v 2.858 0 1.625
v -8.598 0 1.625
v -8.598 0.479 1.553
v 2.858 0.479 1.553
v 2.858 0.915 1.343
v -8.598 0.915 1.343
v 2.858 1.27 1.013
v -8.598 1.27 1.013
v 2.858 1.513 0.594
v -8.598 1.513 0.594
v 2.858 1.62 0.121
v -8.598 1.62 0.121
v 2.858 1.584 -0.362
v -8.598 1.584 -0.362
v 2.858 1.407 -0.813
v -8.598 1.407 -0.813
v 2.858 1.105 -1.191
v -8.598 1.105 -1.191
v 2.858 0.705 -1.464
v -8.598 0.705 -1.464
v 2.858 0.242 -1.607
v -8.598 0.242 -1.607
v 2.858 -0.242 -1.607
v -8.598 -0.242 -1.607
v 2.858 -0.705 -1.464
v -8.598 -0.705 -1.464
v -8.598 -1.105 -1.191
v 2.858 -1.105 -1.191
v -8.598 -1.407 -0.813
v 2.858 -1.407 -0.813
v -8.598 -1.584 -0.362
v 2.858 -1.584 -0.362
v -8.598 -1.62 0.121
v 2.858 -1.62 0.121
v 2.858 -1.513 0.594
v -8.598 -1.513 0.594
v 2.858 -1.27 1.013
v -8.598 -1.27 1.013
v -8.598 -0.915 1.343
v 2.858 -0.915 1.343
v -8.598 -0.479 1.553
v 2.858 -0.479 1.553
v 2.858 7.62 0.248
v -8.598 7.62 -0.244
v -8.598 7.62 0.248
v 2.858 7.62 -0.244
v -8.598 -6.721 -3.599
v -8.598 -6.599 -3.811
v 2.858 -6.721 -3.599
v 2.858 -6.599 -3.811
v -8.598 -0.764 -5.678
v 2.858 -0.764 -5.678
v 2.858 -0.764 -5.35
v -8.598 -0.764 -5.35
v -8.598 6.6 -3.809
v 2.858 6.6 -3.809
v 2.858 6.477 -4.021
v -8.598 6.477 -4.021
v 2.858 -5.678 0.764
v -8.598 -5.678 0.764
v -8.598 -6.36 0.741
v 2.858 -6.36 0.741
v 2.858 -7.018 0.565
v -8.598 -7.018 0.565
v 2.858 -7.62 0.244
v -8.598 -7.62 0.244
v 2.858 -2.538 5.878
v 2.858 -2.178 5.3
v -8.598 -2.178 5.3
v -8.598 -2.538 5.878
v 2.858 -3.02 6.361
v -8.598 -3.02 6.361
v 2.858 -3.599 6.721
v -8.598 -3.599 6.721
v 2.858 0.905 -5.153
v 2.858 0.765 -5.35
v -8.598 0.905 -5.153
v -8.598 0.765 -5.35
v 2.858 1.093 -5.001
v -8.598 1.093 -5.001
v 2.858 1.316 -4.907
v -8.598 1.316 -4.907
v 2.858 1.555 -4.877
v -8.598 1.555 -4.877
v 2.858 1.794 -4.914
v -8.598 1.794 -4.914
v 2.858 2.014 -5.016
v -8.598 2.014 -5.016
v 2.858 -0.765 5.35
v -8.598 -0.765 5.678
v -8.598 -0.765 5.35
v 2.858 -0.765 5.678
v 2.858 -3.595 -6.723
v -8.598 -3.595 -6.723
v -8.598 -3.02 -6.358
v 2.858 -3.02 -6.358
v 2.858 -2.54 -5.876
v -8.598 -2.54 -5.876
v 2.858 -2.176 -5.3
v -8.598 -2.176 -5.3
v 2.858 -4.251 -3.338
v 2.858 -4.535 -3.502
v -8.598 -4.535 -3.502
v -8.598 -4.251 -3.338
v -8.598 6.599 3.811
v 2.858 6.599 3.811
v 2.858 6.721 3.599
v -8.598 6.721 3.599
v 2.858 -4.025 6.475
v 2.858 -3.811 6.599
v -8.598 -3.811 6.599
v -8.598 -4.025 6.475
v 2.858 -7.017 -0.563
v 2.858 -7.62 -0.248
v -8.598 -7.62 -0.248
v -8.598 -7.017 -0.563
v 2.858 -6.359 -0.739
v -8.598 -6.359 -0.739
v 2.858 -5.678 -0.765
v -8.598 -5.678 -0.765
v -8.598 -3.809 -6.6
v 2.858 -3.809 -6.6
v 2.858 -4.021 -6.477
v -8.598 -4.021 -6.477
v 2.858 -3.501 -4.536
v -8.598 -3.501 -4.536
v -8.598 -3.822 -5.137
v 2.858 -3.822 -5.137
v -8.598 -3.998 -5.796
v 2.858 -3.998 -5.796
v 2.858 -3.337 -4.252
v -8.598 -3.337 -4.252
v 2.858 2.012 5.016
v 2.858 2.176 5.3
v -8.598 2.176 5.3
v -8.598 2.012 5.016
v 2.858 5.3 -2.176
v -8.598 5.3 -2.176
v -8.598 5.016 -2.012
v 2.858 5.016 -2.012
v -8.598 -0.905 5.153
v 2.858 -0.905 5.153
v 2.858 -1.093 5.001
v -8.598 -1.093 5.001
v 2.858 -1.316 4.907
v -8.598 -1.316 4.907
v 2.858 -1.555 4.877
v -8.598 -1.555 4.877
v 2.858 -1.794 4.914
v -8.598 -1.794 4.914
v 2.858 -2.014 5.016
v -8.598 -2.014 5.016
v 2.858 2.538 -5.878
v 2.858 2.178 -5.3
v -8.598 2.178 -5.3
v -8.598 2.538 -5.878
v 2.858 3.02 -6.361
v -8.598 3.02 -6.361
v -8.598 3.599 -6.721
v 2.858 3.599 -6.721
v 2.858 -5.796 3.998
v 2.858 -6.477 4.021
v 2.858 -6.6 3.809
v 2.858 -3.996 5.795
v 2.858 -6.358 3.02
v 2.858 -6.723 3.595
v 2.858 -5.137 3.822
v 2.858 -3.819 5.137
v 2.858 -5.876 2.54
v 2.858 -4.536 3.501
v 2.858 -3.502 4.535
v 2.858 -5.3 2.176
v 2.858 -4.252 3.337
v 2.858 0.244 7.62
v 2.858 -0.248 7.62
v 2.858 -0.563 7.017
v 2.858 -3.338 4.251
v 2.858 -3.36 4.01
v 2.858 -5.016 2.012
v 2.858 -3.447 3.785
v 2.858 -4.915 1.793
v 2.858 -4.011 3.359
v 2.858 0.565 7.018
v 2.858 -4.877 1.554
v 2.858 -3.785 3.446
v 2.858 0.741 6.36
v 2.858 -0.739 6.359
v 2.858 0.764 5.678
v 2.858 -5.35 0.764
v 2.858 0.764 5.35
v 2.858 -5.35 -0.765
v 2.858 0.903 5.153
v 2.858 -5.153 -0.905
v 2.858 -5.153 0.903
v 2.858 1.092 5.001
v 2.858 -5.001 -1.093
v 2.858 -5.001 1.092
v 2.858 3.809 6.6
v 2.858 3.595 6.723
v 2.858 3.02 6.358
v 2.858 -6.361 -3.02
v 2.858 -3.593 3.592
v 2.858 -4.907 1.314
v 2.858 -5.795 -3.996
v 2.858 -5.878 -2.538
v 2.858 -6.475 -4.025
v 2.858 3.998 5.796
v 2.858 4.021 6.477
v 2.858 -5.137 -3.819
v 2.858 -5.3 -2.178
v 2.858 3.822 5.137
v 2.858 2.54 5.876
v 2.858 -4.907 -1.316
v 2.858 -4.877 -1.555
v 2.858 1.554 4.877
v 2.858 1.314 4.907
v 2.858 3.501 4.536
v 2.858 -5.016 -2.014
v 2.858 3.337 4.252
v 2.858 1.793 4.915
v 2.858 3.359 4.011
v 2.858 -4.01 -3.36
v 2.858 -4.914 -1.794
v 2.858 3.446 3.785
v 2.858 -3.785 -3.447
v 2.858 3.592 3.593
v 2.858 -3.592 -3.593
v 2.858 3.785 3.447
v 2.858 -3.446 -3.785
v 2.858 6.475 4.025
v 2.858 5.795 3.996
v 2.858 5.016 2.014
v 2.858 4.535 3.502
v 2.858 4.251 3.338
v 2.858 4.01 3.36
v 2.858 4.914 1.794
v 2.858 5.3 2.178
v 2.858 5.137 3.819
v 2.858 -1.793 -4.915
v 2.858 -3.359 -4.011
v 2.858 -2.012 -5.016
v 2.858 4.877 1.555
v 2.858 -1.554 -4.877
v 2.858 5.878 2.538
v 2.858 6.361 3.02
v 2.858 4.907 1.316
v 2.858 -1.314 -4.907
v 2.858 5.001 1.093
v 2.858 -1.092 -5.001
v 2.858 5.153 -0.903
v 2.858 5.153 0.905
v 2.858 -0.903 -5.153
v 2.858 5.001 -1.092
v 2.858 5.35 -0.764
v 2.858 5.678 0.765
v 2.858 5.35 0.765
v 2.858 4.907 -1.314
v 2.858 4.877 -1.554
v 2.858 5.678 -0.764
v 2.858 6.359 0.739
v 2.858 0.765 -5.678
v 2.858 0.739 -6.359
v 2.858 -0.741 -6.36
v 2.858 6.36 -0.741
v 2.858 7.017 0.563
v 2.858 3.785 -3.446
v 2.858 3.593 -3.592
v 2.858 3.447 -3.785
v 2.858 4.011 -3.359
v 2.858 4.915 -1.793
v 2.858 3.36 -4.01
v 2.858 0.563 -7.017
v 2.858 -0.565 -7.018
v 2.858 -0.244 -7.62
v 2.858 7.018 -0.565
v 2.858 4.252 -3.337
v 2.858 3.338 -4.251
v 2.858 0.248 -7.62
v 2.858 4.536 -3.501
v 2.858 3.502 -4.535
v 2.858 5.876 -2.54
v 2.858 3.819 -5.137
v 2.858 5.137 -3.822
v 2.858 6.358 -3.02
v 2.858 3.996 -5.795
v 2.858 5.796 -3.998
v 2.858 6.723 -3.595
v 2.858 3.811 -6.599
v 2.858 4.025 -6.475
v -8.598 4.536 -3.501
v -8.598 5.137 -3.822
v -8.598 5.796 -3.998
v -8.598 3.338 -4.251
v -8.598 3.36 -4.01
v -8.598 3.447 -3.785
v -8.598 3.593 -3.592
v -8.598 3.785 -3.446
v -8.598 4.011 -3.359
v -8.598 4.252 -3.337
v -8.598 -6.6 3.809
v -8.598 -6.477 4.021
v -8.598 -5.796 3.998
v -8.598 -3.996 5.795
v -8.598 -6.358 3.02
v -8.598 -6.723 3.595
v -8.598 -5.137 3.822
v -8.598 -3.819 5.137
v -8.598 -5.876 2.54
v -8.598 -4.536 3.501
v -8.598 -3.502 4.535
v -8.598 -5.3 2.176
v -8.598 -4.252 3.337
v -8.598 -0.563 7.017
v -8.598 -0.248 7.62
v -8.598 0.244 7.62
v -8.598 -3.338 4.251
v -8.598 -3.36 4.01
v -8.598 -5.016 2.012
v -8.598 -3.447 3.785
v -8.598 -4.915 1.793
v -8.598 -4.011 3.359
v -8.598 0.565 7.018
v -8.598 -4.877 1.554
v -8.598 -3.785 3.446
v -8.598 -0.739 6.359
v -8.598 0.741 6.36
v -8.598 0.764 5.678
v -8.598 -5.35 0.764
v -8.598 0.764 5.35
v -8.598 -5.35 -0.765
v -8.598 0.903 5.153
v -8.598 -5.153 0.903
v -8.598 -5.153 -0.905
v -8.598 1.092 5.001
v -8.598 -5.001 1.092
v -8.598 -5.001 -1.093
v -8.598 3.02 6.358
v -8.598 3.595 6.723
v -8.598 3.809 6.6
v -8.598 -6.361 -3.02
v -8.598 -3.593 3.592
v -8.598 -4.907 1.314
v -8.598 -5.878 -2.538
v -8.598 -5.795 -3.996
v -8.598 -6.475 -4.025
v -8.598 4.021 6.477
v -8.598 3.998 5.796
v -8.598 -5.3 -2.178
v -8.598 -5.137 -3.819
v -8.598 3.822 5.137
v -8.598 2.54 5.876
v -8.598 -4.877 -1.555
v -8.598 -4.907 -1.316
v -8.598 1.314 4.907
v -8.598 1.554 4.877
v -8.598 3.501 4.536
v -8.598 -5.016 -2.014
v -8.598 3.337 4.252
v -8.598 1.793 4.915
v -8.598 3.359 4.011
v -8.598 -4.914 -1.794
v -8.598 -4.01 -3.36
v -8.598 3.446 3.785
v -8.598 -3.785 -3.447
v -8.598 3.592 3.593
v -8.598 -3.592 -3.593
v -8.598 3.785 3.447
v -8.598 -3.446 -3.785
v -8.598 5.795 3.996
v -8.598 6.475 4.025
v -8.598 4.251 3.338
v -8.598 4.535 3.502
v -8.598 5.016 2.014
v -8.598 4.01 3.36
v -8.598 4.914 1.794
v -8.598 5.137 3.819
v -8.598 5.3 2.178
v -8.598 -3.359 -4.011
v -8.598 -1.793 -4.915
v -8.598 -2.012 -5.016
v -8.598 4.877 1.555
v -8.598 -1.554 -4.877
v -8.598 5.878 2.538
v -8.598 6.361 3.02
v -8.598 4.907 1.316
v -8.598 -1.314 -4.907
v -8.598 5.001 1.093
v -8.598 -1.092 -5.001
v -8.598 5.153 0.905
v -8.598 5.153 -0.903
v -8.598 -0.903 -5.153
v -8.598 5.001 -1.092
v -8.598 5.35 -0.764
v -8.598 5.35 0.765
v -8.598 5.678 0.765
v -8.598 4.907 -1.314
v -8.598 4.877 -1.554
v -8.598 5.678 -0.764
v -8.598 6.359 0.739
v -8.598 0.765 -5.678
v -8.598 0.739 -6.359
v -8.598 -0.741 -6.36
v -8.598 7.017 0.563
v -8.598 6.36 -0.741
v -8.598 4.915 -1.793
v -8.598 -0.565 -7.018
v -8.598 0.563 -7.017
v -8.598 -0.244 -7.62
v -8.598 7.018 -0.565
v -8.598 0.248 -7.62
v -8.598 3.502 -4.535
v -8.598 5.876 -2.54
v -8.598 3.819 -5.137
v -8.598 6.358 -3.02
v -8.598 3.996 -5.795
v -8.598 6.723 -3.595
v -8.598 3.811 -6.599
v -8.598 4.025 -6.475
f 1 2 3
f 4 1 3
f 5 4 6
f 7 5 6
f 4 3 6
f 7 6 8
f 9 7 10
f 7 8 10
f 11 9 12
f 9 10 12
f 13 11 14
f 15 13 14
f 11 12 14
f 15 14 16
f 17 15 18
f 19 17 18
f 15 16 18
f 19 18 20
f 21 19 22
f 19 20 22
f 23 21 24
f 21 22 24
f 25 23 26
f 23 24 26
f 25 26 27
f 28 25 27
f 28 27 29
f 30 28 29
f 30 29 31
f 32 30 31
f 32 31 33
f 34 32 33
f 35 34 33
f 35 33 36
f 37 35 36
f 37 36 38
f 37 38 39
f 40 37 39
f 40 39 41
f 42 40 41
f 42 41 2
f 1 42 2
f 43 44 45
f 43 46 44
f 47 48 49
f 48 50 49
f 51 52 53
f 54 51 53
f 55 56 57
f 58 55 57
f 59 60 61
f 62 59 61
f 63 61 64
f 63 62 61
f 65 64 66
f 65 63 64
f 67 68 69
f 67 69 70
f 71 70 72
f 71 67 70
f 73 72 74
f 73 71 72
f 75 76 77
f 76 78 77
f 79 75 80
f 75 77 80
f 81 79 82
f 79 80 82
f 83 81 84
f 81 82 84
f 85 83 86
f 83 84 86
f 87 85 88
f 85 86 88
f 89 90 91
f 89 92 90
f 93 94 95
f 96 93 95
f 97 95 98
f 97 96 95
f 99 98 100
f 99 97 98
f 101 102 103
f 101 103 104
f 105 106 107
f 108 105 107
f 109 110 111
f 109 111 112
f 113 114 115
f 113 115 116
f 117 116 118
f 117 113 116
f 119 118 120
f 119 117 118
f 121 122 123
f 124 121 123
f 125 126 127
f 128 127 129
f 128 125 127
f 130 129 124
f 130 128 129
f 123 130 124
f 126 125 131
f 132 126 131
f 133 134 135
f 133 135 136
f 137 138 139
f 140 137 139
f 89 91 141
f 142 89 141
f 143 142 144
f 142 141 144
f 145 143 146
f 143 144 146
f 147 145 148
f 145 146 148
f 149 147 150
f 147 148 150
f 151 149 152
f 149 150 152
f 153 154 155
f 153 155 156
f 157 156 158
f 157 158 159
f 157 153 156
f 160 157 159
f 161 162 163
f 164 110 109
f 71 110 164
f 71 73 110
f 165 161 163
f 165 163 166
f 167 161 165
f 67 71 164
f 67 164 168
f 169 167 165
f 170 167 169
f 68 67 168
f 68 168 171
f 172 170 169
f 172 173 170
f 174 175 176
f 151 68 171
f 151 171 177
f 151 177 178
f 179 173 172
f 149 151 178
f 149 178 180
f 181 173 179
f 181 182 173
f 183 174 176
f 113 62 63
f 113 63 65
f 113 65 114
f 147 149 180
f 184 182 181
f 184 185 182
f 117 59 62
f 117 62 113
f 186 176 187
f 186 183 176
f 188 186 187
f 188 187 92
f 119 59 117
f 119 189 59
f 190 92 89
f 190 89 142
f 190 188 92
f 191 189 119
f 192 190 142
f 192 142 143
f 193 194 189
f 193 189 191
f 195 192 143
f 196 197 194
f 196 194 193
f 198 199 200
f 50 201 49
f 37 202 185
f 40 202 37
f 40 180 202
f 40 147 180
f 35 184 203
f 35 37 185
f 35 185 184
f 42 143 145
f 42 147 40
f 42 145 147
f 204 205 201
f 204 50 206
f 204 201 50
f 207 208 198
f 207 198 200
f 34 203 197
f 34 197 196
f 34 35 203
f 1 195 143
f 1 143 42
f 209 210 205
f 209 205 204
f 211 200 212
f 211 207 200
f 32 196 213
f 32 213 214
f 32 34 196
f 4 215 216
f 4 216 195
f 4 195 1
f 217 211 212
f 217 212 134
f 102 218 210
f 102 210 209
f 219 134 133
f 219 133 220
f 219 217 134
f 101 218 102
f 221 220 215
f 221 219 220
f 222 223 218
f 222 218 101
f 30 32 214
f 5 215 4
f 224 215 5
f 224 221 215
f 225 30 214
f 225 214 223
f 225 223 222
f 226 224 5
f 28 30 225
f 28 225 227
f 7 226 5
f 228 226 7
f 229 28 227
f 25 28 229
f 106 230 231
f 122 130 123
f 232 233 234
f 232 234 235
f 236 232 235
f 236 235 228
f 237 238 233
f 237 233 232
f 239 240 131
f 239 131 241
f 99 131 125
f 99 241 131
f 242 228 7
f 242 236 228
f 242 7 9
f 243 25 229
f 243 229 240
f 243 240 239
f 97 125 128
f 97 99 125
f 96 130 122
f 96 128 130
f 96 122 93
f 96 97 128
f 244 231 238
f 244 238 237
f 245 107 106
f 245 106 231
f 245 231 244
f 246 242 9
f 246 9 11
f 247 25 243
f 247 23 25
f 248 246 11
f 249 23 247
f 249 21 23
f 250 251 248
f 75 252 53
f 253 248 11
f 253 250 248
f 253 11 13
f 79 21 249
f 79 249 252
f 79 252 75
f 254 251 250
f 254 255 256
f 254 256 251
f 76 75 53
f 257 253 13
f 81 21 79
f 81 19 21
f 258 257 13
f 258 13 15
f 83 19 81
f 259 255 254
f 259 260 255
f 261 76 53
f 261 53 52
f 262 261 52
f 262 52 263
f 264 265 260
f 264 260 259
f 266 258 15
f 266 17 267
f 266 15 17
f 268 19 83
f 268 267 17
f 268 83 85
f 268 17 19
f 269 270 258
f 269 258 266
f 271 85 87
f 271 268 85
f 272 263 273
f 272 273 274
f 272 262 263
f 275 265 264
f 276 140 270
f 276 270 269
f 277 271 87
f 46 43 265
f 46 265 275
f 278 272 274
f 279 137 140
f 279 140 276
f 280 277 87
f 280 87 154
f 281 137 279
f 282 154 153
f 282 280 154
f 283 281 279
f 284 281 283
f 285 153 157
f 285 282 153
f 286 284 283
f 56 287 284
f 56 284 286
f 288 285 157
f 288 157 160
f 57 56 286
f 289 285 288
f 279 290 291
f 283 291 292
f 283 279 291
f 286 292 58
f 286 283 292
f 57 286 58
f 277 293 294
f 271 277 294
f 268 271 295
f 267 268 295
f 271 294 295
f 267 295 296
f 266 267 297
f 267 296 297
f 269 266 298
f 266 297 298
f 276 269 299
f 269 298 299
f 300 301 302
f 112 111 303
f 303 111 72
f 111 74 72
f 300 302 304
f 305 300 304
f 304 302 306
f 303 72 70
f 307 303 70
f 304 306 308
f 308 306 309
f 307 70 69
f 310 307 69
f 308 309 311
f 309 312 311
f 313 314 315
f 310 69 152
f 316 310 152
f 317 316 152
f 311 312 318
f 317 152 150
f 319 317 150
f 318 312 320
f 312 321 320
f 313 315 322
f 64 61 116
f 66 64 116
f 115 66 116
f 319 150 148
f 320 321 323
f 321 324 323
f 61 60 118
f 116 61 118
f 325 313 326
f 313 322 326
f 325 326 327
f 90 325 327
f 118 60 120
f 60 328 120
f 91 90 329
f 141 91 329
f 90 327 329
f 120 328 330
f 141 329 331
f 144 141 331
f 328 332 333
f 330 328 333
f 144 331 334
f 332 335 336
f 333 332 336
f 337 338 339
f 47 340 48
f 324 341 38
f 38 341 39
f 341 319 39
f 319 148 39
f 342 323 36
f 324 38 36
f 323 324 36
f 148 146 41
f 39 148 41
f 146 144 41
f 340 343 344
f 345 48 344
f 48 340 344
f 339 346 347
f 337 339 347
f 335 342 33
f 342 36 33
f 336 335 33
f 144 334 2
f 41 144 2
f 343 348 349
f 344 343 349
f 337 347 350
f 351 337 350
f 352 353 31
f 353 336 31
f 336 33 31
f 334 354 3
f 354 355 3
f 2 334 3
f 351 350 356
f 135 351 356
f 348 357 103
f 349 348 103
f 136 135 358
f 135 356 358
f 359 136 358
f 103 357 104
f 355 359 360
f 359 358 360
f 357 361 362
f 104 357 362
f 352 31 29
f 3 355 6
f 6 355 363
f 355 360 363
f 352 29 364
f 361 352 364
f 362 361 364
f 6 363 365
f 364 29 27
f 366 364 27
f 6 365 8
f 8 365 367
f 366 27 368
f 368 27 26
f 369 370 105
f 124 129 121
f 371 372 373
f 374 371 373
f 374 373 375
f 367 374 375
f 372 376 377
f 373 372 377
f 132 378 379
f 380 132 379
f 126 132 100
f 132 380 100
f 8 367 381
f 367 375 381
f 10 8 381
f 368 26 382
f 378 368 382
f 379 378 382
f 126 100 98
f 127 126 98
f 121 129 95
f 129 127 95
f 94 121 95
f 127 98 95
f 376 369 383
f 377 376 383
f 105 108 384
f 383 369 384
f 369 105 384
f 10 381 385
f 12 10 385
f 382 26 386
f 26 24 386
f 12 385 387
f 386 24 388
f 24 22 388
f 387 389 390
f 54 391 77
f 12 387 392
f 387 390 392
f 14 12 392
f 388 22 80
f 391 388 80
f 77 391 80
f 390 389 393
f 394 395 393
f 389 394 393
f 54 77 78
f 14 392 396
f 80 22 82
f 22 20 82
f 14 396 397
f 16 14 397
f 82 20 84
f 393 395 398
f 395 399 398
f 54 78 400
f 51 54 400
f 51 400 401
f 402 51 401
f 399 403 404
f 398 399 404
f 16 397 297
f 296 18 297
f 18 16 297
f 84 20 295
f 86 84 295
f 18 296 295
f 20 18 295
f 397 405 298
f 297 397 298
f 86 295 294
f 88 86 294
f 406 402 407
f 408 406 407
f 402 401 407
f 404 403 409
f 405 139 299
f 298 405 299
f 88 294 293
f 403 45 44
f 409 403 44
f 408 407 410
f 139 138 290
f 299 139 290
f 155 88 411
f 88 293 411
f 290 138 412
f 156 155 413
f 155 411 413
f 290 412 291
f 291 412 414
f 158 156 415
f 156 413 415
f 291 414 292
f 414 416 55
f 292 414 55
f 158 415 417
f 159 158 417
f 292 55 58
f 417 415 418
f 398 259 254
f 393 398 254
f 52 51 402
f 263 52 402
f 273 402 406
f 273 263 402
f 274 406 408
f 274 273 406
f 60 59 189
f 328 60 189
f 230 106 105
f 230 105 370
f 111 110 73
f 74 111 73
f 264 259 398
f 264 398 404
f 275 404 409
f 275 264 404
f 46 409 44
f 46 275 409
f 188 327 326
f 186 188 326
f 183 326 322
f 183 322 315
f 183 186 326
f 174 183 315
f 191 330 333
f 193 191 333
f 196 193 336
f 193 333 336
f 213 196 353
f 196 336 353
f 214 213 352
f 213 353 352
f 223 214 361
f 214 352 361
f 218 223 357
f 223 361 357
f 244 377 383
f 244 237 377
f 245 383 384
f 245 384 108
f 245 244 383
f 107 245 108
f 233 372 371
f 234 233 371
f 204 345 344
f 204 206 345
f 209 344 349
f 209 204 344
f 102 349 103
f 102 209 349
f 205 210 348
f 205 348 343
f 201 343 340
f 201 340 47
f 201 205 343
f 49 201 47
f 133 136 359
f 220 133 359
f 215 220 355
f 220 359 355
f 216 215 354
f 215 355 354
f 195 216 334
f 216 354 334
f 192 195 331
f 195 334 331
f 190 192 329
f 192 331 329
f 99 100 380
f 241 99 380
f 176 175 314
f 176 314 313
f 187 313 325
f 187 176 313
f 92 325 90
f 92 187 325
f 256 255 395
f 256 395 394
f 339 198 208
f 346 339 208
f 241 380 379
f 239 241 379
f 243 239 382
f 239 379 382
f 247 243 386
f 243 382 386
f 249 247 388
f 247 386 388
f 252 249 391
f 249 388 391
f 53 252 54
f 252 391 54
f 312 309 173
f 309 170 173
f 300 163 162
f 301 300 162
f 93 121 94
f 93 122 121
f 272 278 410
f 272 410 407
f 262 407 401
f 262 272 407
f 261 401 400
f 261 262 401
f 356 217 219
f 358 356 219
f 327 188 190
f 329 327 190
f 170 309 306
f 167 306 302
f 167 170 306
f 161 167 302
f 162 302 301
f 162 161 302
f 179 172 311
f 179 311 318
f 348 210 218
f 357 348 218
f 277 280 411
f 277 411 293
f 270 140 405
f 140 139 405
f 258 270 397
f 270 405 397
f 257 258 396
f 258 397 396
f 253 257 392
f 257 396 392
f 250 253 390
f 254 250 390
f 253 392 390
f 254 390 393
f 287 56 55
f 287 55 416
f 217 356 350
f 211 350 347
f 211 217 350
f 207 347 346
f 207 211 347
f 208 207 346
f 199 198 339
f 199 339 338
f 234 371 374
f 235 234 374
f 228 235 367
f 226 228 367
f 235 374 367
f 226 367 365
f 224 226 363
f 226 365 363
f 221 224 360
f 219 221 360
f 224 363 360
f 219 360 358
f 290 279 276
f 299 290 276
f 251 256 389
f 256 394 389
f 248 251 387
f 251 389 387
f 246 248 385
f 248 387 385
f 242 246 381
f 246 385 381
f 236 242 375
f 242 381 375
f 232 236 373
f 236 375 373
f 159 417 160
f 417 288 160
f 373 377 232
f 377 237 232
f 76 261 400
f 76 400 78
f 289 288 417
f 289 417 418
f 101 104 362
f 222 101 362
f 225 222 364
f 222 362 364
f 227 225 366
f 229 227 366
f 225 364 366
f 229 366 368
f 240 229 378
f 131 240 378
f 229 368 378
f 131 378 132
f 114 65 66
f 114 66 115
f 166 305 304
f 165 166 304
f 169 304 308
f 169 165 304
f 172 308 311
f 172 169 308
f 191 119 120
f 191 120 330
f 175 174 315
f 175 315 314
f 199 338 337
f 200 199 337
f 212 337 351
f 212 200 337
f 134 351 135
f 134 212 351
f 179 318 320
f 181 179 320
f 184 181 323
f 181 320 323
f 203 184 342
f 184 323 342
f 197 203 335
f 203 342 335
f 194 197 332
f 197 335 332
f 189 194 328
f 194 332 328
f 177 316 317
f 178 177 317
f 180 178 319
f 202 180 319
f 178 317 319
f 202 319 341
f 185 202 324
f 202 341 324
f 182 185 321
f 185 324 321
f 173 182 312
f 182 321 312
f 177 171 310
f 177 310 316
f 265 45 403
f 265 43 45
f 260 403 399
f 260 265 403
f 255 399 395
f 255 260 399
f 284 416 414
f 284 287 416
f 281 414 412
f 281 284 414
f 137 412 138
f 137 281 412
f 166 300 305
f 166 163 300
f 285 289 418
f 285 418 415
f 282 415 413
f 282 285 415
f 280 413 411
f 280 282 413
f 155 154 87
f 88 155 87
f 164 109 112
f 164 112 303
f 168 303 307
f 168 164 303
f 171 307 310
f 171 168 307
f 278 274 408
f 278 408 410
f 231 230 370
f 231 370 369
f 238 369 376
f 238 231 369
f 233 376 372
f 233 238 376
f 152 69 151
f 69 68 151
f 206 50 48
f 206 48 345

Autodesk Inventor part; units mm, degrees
ref_plane "YZ Plane" through (0, 0, 0) normal (1, 0, 0) x (0, 1, 0)
ref_plane "XZ Plane" through (0, 0, 0) normal (0, 1, 0) x (-1, 0, 0)
ref_plane "Work Plane2" through (2.8575, 0, 0) normal (1, 0, 0) x (0, 0, -1)
sketch "Sketch6" plane through (2.8575, 0, 0) normal (1, 0, 0) x (0, 0, -1)
  line L0 (0.7654, -5.6784) -> (0.7654, -5.022)
  line L1 (-0.7638, -5.6784) -> (-0.7638, -5.0222)
  arc A0 (5.6006, 2.3498) -> (5.5837, 2.3418) centre (6.3532, 0.7382) ccw
  arc A1 (-0.7638, -5.0222) -> (0.7654, -5.022) centre (0, 0) ccw
  line L2 (0.0008, -7.62) -> (-0.2439, -7.62)
  line L3 (0.0008, -7.62) -> (0.2479, -7.62)
  arc A2 (0.2479, -7.62) -> (0.7654, -5.6784) centre (-2.309, -5.8988) ccw
  arc A3 (-0.7638, -5.6784) -> (-0.2439, -7.62) centre (2.2185, -5.9201) ccw
  arc A4 (3.5877, -3.5965) -> (3.5976, -3.5866) centre (0, 0) ccw
  line L4 (3.502, -4.5349) -> (3.1738, -3.9665)
  line L5 (2.1777, -5.2996) -> (1.8496, -4.7313)
  arc A5 (1.8496, -4.7313) -> (3.1738, -3.9665) centre (0, 0) ccw
  line L6 (3.8107, -6.5987) -> (3.5988, -6.721)
  line L7 (3.8107, -6.5987) -> (4.0247, -6.4752)
  arc A6 (4.0247, -6.4752) -> (3.502, -4.5349) centre (0.9498, -6.263) ccw
  arc A7 (2.1777, -5.2996) -> (3.5988, -6.721) centre (4.8813, -4.0177) ccw
  line L8 (5.3003, -2.1764) -> (4.7319, -1.8482)
  line L9 (4.5358, -3.5007) -> (3.9675, -3.1726)
  arc A8 (3.9675, -3.1726) -> (4.7319, -1.8482) centre (0, 0) ccw
  line L10 (6.5995, -3.8093) -> (6.4772, -4.0212)
  line L11 (6.5995, -3.8093) -> (6.7231, -3.5953)
  arc A9 (6.7231, -3.5953) -> (5.3003, -2.1764) centre (3.954, -4.949) ccw
  arc A10 (4.5358, -3.5007) -> (6.4772, -4.0212) centre (6.2362, -1.0388) ccw
  line L12 (5.6784, 0.7654) -> (5.022, 0.7654)
  line L13 (5.6784, -0.7638) -> (5.0222, -0.7638)
  arc A11 (5.0222, -0.7638) -> (5.022, 0.7654) centre (0, 0) ccw
  line L14 (7.62, 0.0008) -> (7.62, -0.2439)
  line L15 (7.62, 0.0008) -> (7.62, 0.2479)
  arc A12 (7.62, 0.2479) -> (5.6784, 0.7654) centre (5.8988, -2.309) ccw
  arc A13 (5.6784, -0.7638) -> (7.62, -0.2439) centre (5.9201, 2.2185) ccw
  line L16 (4.5349, 3.502) -> (3.9665, 3.1738)
  line L17 (5.2996, 2.1777) -> (4.7313, 1.8496)
  arc A14 (4.7313, 1.8496) -> (3.9665, 3.1738) centre (0, 0) ccw
  line L18 (6.5987, 3.8107) -> (6.721, 3.5988)
  line L19 (6.5987, 3.8107) -> (6.4752, 4.0247)
  arc A15 (6.4752, 4.0247) -> (4.5349, 3.502) centre (6.263, 0.9498) ccw
  arc A16 (5.2996, 2.1777) -> (6.721, 3.5988) centre (4.0177, 4.8813) ccw
  line L20 (2.1764, 5.3003) -> (1.8482, 4.7319)
  line L21 (3.5007, 4.5358) -> (3.1726, 3.9675)
  arc A17 (3.1726, 3.9675) -> (1.8482, 4.7319) centre (0, 0) ccw
  line L22 (3.8093, 6.5995) -> (4.0212, 6.4772)
  line L23 (3.8093, 6.5995) -> (3.5953, 6.7231)
  arc A18 (3.5953, 6.7231) -> (2.1764, 5.3003) centre (4.949, 3.954) ccw
  arc A19 (3.5007, 4.5358) -> (4.0212, 6.4772) centre (1.0388, 6.2362) ccw
  line L24 (-0.7654, 5.6784) -> (-0.7654, 5.022)
  line L25 (0.7638, 5.6784) -> (0.7638, 5.0222)
  arc A20 (0.7638, 5.0222) -> (-0.7654, 5.022) centre (0, 0) ccw
  line L26 (-0.0008, 7.62) -> (0.2439, 7.62)
  line L27 (-0.0008, 7.62) -> (-0.2479, 7.62)
  arc A21 (-0.2479, 7.62) -> (-0.7654, 5.6784) centre (2.309, 5.8988) ccw
  arc A22 (0.7638, 5.6784) -> (0.2439, 7.62) centre (-2.2185, 5.9201) ccw
  line L28 (-3.502, 4.5349) -> (-3.1738, 3.9665)
  line L29 (-2.1777, 5.2996) -> (-1.8496, 4.7313)
  arc A23 (-1.8496, 4.7313) -> (-3.1738, 3.9665) centre (0, 0) ccw
  line L30 (-3.8107, 6.5987) -> (-3.5988, 6.721)
  line L31 (-3.8107, 6.5987) -> (-4.0247, 6.4752)
  arc A24 (-4.0247, 6.4752) -> (-3.502, 4.5349) centre (-0.9498, 6.263) ccw
  arc A25 (-2.1777, 5.2996) -> (-3.5988, 6.721) centre (-4.8813, 4.0177) ccw
  line L32 (-5.3003, 2.1764) -> (-4.7319, 1.8482)
  line L33 (-4.5358, 3.5007) -> (-3.9675, 3.1726)
  arc A26 (-3.9675, 3.1726) -> (-4.7319, 1.8482) centre (0, 0) ccw
  line L34 (-6.5995, 3.8093) -> (-6.4772, 4.0212)
  line L35 (-6.5995, 3.8093) -> (-6.7231, 3.5953)
  arc A27 (-6.7231, 3.5953) -> (-5.3003, 2.1764) centre (-3.954, 4.949) ccw
  arc A28 (-4.5358, 3.5007) -> (-6.4772, 4.0212) centre (-6.2362, 1.0388) ccw
  line L36 (-5.6784, -0.7654) -> (-5.022, -0.7654)
  line L37 (-5.6784, 0.7638) -> (-5.0222, 0.7638)
  arc A29 (-5.0222, 0.7638) -> (-5.022, -0.7654) centre (0, 0) ccw
  line L38 (-7.62, -0.0008) -> (-7.62, 0.2439)
  line L39 (-7.62, -0.0008) -> (-7.62, -0.2479)
  arc A30 (-7.62, -0.2479) -> (-5.6784, -0.7654) centre (-5.8988, 2.309) ccw
  arc A31 (-5.6784, 0.7638) -> (-7.62, 0.2439) centre (-5.9201, -2.2185) ccw
  line L40 (-4.5349, -3.502) -> (-3.9665, -3.1738)
  line L41 (-5.2996, -2.1777) -> (-4.7313, -1.8496)
  arc A32 (-4.7313, -1.8496) -> (-3.9665, -3.1738) centre (0, 0) ccw
  line L42 (-6.5987, -3.8107) -> (-6.721, -3.5988)
  line L43 (-6.5987, -3.8107) -> (-6.4752, -4.0247)
  arc A33 (-6.4752, -4.0247) -> (-4.5349, -3.502) centre (-6.263, -0.9498) ccw
  arc A34 (-5.2996, -2.1777) -> (-6.721, -3.5988) centre (-4.0177, -4.8813) ccw
  line L44 (-2.1764, -5.3003) -> (-1.8482, -4.7319)
  line L45 (-3.5007, -4.5358) -> (-3.1726, -3.9675)
  arc A35 (-3.1726, -3.9675) -> (-1.8482, -4.7319) centre (0, 0) ccw
  line L46 (-3.8093, -6.5995) -> (-4.0212, -6.4772)
  line L47 (-3.8093, -6.5995) -> (-3.5953, -6.7231)
  arc A36 (-3.5953, -6.7231) -> (-2.1764, -5.3003) centre (-4.949, -3.954) ccw
  arc A37 (-3.5007, -4.5358) -> (-4.0212, -6.4772) centre (-1.0388, -6.2362) ccw
  arc A38 (-1.8482, -4.7319) -> (-0.7638, -5.0222) centre (0, 0) ccw
  line L48 (-2.0137, 5.0155) -> (-0.7654, 5.3502)
  line L49 (0.7638, 5.3503) -> (2.0123, 5.0161)
  line L50 (3.3367, 4.2516) -> (4.2507, 3.3379)
  line L51 (5.0155, 2.0137) -> (5.3502, 0.7654)
  line L52 (5.3503, -0.7638) -> (5.0161, -2.0123)
  line L53 (4.2516, -3.3367) -> (3.3379, -4.2507)
  line L54 (2.0137, -5.0155) -> (0.7654, -5.3502)
  line L55 (-0.7638, -5.3503) -> (-2.0123, -5.0161)
  line L56 (-3.3367, -4.2516) -> (-4.2507, -3.3379)
  line L57 (-5.0155, -2.0137) -> (-5.3502, -0.7654)
  line L58 (-5.3503, 0.7638) -> (-5.0161, 2.0123)
  line L59 (-4.2516, 3.3367) -> (-3.3379, 4.2507)
  circle A39 centre (0, 0) radius 5.0531
  point P0 (0, 0)
  point P1 (-4.2516, 3.3367)
  dimension "d94" = 360
extrude "Extrusion19" add sketch "Sketch6" against normal blind 11.4554 contours A2 L3 L2 A3 L1 A1 L0 | L0 A1 A38 A35 L45 L56 L40 A32 L41 L57 L36 A29 L37 L58 L32 A26 L33 L59 L28 A23 L29 L48 L24 A20 L25 L49 L20 A17 L21 L50 L16 A14 L17 L51 L12 A11 L13 L52 L8 A8 L9 L53 L4 A5 L5 L54 | L5 A5 L4 A6 L7 L6 A7 | L1 L55 L44 A38 | L44 A36 L47 L46 A37 L45 A35 | L9 A8 L8 A9 L11 L10 A10 | L40 A33 L43 L42 A34 L41 A32 | L13 A11 L12 A12 L15 L14 A13 | L36 A30 L39 L38 A31 L37 A29 | L17 A14 L16 A15 L19 L18 A16 | L32 A27 L35 L34 A28 L33 A26 | L21 A17 L20 A18 L23 L22 A19 | L28 A24 L31 L30 A25 L29 A23 | L25 A20 L24 A21 L27 L26 A22 | A39
sketch "Sketch7" plane through (-8.5979, 0, 0) normal (-1, 0, 0) x (0, 0, 1)
  circle A0 centre (0, 0) radius 1.625
  dimension "d104" = 3.25
extrude "Extrusion20" cut sketch "Sketch7" against normal blind 2540
sketch "Sketch8" plane through (-8.5979, 0, 0) normal (-1, 0, 0) x (0, 0, 1)
  circle A0 centre (0, 0) radius 5.08
  line L0 (-3.3367, 4.2516) -> (-4.2507, 3.3379) projected
  arc A1 (-4.2507, 3.3379) -> (-3.3367, 4.2516) centre (-4.209, 4.2103) ccw
  line L1 (-3.3367, 4.2516) -> (-3.5007, 4.5358) projected
  line L2 (-4.2507, 3.3379) -> (-3.3367, 4.2516)
  arc A2 (-5.3502, 0.7654) -> (-5.0155, 2.0137) centre (-5.7503, 1.5417) ccw
  line L3 (-5.3502, 0.7654) -> (-5.0155, 2.0137)
  arc A3 (-5.0161, -2.0123) -> (-5.3503, -0.7638) centre (-5.7507, -1.54) ccw
  line L4 (-5.0161, -2.0123) -> (-5.3503, -0.7638)
  arc A4 (-3.3379, -4.2507) -> (-4.2516, -3.3367) centre (-4.2103, -4.209) ccw
  line L5 (-3.3379, -4.2507) -> (-4.2516, -3.3367)
  arc A5 (-0.7654, -5.3502) -> (-2.0137, -5.0155) centre (-1.5417, -5.7503) ccw
  line L6 (-0.7654, -5.3502) -> (-2.0137, -5.0155)
  arc A6 (2.0123, -5.0161) -> (0.7638, -5.3503) centre (1.54, -5.7507) ccw
  line L7 (2.0123, -5.0161) -> (0.7638, -5.3503)
  arc A7 (4.2507, -3.3379) -> (3.3367, -4.2516) centre (4.209, -4.2103) ccw
  line L8 (4.2507, -3.3379) -> (3.3367, -4.2516)
  arc A8 (5.3502, -0.7654) -> (5.0155, -2.0137) centre (5.7503, -1.5417) ccw
  line L9 (5.3502, -0.7654) -> (5.0155, -2.0137)
  arc A9 (5.0161, 2.0123) -> (5.3503, 0.7638) centre (5.7507, 1.54) ccw
  line L10 (5.0161, 2.0123) -> (5.3503, 0.7638)
  arc A10 (3.3379, 4.2507) -> (4.2516, 3.3367) centre (4.2103, 4.209) ccw
  line L11 (3.3379, 4.2507) -> (4.2516, 3.3367)
  arc A11 (0.7654, 5.3502) -> (2.0137, 5.0155) centre (1.5417, 5.7503) ccw
  line L12 (0.7654, 5.3502) -> (2.0137, 5.0155)
  arc A12 (-2.0123, 5.0161) -> (-0.7638, 5.3503) centre (-1.54, 5.7507) ccw
  line L13 (-2.0123, 5.0161) -> (-0.7638, 5.3503)
  dimension "d107" = 10.16
  dimension "d110" = 360
extrude "Extrusion21" cut sketch "Sketch8" against normal blind 2540 contours A8 L9 | A7 L8 | A6 L7 | A5 L6 | A4 L5 | A3 L4 | A2 L3 | A1 L0 | A12 L13 | A11 L12 | A10 L11 | A9 L10
properties part number "Alligator_Pinion (2)"
